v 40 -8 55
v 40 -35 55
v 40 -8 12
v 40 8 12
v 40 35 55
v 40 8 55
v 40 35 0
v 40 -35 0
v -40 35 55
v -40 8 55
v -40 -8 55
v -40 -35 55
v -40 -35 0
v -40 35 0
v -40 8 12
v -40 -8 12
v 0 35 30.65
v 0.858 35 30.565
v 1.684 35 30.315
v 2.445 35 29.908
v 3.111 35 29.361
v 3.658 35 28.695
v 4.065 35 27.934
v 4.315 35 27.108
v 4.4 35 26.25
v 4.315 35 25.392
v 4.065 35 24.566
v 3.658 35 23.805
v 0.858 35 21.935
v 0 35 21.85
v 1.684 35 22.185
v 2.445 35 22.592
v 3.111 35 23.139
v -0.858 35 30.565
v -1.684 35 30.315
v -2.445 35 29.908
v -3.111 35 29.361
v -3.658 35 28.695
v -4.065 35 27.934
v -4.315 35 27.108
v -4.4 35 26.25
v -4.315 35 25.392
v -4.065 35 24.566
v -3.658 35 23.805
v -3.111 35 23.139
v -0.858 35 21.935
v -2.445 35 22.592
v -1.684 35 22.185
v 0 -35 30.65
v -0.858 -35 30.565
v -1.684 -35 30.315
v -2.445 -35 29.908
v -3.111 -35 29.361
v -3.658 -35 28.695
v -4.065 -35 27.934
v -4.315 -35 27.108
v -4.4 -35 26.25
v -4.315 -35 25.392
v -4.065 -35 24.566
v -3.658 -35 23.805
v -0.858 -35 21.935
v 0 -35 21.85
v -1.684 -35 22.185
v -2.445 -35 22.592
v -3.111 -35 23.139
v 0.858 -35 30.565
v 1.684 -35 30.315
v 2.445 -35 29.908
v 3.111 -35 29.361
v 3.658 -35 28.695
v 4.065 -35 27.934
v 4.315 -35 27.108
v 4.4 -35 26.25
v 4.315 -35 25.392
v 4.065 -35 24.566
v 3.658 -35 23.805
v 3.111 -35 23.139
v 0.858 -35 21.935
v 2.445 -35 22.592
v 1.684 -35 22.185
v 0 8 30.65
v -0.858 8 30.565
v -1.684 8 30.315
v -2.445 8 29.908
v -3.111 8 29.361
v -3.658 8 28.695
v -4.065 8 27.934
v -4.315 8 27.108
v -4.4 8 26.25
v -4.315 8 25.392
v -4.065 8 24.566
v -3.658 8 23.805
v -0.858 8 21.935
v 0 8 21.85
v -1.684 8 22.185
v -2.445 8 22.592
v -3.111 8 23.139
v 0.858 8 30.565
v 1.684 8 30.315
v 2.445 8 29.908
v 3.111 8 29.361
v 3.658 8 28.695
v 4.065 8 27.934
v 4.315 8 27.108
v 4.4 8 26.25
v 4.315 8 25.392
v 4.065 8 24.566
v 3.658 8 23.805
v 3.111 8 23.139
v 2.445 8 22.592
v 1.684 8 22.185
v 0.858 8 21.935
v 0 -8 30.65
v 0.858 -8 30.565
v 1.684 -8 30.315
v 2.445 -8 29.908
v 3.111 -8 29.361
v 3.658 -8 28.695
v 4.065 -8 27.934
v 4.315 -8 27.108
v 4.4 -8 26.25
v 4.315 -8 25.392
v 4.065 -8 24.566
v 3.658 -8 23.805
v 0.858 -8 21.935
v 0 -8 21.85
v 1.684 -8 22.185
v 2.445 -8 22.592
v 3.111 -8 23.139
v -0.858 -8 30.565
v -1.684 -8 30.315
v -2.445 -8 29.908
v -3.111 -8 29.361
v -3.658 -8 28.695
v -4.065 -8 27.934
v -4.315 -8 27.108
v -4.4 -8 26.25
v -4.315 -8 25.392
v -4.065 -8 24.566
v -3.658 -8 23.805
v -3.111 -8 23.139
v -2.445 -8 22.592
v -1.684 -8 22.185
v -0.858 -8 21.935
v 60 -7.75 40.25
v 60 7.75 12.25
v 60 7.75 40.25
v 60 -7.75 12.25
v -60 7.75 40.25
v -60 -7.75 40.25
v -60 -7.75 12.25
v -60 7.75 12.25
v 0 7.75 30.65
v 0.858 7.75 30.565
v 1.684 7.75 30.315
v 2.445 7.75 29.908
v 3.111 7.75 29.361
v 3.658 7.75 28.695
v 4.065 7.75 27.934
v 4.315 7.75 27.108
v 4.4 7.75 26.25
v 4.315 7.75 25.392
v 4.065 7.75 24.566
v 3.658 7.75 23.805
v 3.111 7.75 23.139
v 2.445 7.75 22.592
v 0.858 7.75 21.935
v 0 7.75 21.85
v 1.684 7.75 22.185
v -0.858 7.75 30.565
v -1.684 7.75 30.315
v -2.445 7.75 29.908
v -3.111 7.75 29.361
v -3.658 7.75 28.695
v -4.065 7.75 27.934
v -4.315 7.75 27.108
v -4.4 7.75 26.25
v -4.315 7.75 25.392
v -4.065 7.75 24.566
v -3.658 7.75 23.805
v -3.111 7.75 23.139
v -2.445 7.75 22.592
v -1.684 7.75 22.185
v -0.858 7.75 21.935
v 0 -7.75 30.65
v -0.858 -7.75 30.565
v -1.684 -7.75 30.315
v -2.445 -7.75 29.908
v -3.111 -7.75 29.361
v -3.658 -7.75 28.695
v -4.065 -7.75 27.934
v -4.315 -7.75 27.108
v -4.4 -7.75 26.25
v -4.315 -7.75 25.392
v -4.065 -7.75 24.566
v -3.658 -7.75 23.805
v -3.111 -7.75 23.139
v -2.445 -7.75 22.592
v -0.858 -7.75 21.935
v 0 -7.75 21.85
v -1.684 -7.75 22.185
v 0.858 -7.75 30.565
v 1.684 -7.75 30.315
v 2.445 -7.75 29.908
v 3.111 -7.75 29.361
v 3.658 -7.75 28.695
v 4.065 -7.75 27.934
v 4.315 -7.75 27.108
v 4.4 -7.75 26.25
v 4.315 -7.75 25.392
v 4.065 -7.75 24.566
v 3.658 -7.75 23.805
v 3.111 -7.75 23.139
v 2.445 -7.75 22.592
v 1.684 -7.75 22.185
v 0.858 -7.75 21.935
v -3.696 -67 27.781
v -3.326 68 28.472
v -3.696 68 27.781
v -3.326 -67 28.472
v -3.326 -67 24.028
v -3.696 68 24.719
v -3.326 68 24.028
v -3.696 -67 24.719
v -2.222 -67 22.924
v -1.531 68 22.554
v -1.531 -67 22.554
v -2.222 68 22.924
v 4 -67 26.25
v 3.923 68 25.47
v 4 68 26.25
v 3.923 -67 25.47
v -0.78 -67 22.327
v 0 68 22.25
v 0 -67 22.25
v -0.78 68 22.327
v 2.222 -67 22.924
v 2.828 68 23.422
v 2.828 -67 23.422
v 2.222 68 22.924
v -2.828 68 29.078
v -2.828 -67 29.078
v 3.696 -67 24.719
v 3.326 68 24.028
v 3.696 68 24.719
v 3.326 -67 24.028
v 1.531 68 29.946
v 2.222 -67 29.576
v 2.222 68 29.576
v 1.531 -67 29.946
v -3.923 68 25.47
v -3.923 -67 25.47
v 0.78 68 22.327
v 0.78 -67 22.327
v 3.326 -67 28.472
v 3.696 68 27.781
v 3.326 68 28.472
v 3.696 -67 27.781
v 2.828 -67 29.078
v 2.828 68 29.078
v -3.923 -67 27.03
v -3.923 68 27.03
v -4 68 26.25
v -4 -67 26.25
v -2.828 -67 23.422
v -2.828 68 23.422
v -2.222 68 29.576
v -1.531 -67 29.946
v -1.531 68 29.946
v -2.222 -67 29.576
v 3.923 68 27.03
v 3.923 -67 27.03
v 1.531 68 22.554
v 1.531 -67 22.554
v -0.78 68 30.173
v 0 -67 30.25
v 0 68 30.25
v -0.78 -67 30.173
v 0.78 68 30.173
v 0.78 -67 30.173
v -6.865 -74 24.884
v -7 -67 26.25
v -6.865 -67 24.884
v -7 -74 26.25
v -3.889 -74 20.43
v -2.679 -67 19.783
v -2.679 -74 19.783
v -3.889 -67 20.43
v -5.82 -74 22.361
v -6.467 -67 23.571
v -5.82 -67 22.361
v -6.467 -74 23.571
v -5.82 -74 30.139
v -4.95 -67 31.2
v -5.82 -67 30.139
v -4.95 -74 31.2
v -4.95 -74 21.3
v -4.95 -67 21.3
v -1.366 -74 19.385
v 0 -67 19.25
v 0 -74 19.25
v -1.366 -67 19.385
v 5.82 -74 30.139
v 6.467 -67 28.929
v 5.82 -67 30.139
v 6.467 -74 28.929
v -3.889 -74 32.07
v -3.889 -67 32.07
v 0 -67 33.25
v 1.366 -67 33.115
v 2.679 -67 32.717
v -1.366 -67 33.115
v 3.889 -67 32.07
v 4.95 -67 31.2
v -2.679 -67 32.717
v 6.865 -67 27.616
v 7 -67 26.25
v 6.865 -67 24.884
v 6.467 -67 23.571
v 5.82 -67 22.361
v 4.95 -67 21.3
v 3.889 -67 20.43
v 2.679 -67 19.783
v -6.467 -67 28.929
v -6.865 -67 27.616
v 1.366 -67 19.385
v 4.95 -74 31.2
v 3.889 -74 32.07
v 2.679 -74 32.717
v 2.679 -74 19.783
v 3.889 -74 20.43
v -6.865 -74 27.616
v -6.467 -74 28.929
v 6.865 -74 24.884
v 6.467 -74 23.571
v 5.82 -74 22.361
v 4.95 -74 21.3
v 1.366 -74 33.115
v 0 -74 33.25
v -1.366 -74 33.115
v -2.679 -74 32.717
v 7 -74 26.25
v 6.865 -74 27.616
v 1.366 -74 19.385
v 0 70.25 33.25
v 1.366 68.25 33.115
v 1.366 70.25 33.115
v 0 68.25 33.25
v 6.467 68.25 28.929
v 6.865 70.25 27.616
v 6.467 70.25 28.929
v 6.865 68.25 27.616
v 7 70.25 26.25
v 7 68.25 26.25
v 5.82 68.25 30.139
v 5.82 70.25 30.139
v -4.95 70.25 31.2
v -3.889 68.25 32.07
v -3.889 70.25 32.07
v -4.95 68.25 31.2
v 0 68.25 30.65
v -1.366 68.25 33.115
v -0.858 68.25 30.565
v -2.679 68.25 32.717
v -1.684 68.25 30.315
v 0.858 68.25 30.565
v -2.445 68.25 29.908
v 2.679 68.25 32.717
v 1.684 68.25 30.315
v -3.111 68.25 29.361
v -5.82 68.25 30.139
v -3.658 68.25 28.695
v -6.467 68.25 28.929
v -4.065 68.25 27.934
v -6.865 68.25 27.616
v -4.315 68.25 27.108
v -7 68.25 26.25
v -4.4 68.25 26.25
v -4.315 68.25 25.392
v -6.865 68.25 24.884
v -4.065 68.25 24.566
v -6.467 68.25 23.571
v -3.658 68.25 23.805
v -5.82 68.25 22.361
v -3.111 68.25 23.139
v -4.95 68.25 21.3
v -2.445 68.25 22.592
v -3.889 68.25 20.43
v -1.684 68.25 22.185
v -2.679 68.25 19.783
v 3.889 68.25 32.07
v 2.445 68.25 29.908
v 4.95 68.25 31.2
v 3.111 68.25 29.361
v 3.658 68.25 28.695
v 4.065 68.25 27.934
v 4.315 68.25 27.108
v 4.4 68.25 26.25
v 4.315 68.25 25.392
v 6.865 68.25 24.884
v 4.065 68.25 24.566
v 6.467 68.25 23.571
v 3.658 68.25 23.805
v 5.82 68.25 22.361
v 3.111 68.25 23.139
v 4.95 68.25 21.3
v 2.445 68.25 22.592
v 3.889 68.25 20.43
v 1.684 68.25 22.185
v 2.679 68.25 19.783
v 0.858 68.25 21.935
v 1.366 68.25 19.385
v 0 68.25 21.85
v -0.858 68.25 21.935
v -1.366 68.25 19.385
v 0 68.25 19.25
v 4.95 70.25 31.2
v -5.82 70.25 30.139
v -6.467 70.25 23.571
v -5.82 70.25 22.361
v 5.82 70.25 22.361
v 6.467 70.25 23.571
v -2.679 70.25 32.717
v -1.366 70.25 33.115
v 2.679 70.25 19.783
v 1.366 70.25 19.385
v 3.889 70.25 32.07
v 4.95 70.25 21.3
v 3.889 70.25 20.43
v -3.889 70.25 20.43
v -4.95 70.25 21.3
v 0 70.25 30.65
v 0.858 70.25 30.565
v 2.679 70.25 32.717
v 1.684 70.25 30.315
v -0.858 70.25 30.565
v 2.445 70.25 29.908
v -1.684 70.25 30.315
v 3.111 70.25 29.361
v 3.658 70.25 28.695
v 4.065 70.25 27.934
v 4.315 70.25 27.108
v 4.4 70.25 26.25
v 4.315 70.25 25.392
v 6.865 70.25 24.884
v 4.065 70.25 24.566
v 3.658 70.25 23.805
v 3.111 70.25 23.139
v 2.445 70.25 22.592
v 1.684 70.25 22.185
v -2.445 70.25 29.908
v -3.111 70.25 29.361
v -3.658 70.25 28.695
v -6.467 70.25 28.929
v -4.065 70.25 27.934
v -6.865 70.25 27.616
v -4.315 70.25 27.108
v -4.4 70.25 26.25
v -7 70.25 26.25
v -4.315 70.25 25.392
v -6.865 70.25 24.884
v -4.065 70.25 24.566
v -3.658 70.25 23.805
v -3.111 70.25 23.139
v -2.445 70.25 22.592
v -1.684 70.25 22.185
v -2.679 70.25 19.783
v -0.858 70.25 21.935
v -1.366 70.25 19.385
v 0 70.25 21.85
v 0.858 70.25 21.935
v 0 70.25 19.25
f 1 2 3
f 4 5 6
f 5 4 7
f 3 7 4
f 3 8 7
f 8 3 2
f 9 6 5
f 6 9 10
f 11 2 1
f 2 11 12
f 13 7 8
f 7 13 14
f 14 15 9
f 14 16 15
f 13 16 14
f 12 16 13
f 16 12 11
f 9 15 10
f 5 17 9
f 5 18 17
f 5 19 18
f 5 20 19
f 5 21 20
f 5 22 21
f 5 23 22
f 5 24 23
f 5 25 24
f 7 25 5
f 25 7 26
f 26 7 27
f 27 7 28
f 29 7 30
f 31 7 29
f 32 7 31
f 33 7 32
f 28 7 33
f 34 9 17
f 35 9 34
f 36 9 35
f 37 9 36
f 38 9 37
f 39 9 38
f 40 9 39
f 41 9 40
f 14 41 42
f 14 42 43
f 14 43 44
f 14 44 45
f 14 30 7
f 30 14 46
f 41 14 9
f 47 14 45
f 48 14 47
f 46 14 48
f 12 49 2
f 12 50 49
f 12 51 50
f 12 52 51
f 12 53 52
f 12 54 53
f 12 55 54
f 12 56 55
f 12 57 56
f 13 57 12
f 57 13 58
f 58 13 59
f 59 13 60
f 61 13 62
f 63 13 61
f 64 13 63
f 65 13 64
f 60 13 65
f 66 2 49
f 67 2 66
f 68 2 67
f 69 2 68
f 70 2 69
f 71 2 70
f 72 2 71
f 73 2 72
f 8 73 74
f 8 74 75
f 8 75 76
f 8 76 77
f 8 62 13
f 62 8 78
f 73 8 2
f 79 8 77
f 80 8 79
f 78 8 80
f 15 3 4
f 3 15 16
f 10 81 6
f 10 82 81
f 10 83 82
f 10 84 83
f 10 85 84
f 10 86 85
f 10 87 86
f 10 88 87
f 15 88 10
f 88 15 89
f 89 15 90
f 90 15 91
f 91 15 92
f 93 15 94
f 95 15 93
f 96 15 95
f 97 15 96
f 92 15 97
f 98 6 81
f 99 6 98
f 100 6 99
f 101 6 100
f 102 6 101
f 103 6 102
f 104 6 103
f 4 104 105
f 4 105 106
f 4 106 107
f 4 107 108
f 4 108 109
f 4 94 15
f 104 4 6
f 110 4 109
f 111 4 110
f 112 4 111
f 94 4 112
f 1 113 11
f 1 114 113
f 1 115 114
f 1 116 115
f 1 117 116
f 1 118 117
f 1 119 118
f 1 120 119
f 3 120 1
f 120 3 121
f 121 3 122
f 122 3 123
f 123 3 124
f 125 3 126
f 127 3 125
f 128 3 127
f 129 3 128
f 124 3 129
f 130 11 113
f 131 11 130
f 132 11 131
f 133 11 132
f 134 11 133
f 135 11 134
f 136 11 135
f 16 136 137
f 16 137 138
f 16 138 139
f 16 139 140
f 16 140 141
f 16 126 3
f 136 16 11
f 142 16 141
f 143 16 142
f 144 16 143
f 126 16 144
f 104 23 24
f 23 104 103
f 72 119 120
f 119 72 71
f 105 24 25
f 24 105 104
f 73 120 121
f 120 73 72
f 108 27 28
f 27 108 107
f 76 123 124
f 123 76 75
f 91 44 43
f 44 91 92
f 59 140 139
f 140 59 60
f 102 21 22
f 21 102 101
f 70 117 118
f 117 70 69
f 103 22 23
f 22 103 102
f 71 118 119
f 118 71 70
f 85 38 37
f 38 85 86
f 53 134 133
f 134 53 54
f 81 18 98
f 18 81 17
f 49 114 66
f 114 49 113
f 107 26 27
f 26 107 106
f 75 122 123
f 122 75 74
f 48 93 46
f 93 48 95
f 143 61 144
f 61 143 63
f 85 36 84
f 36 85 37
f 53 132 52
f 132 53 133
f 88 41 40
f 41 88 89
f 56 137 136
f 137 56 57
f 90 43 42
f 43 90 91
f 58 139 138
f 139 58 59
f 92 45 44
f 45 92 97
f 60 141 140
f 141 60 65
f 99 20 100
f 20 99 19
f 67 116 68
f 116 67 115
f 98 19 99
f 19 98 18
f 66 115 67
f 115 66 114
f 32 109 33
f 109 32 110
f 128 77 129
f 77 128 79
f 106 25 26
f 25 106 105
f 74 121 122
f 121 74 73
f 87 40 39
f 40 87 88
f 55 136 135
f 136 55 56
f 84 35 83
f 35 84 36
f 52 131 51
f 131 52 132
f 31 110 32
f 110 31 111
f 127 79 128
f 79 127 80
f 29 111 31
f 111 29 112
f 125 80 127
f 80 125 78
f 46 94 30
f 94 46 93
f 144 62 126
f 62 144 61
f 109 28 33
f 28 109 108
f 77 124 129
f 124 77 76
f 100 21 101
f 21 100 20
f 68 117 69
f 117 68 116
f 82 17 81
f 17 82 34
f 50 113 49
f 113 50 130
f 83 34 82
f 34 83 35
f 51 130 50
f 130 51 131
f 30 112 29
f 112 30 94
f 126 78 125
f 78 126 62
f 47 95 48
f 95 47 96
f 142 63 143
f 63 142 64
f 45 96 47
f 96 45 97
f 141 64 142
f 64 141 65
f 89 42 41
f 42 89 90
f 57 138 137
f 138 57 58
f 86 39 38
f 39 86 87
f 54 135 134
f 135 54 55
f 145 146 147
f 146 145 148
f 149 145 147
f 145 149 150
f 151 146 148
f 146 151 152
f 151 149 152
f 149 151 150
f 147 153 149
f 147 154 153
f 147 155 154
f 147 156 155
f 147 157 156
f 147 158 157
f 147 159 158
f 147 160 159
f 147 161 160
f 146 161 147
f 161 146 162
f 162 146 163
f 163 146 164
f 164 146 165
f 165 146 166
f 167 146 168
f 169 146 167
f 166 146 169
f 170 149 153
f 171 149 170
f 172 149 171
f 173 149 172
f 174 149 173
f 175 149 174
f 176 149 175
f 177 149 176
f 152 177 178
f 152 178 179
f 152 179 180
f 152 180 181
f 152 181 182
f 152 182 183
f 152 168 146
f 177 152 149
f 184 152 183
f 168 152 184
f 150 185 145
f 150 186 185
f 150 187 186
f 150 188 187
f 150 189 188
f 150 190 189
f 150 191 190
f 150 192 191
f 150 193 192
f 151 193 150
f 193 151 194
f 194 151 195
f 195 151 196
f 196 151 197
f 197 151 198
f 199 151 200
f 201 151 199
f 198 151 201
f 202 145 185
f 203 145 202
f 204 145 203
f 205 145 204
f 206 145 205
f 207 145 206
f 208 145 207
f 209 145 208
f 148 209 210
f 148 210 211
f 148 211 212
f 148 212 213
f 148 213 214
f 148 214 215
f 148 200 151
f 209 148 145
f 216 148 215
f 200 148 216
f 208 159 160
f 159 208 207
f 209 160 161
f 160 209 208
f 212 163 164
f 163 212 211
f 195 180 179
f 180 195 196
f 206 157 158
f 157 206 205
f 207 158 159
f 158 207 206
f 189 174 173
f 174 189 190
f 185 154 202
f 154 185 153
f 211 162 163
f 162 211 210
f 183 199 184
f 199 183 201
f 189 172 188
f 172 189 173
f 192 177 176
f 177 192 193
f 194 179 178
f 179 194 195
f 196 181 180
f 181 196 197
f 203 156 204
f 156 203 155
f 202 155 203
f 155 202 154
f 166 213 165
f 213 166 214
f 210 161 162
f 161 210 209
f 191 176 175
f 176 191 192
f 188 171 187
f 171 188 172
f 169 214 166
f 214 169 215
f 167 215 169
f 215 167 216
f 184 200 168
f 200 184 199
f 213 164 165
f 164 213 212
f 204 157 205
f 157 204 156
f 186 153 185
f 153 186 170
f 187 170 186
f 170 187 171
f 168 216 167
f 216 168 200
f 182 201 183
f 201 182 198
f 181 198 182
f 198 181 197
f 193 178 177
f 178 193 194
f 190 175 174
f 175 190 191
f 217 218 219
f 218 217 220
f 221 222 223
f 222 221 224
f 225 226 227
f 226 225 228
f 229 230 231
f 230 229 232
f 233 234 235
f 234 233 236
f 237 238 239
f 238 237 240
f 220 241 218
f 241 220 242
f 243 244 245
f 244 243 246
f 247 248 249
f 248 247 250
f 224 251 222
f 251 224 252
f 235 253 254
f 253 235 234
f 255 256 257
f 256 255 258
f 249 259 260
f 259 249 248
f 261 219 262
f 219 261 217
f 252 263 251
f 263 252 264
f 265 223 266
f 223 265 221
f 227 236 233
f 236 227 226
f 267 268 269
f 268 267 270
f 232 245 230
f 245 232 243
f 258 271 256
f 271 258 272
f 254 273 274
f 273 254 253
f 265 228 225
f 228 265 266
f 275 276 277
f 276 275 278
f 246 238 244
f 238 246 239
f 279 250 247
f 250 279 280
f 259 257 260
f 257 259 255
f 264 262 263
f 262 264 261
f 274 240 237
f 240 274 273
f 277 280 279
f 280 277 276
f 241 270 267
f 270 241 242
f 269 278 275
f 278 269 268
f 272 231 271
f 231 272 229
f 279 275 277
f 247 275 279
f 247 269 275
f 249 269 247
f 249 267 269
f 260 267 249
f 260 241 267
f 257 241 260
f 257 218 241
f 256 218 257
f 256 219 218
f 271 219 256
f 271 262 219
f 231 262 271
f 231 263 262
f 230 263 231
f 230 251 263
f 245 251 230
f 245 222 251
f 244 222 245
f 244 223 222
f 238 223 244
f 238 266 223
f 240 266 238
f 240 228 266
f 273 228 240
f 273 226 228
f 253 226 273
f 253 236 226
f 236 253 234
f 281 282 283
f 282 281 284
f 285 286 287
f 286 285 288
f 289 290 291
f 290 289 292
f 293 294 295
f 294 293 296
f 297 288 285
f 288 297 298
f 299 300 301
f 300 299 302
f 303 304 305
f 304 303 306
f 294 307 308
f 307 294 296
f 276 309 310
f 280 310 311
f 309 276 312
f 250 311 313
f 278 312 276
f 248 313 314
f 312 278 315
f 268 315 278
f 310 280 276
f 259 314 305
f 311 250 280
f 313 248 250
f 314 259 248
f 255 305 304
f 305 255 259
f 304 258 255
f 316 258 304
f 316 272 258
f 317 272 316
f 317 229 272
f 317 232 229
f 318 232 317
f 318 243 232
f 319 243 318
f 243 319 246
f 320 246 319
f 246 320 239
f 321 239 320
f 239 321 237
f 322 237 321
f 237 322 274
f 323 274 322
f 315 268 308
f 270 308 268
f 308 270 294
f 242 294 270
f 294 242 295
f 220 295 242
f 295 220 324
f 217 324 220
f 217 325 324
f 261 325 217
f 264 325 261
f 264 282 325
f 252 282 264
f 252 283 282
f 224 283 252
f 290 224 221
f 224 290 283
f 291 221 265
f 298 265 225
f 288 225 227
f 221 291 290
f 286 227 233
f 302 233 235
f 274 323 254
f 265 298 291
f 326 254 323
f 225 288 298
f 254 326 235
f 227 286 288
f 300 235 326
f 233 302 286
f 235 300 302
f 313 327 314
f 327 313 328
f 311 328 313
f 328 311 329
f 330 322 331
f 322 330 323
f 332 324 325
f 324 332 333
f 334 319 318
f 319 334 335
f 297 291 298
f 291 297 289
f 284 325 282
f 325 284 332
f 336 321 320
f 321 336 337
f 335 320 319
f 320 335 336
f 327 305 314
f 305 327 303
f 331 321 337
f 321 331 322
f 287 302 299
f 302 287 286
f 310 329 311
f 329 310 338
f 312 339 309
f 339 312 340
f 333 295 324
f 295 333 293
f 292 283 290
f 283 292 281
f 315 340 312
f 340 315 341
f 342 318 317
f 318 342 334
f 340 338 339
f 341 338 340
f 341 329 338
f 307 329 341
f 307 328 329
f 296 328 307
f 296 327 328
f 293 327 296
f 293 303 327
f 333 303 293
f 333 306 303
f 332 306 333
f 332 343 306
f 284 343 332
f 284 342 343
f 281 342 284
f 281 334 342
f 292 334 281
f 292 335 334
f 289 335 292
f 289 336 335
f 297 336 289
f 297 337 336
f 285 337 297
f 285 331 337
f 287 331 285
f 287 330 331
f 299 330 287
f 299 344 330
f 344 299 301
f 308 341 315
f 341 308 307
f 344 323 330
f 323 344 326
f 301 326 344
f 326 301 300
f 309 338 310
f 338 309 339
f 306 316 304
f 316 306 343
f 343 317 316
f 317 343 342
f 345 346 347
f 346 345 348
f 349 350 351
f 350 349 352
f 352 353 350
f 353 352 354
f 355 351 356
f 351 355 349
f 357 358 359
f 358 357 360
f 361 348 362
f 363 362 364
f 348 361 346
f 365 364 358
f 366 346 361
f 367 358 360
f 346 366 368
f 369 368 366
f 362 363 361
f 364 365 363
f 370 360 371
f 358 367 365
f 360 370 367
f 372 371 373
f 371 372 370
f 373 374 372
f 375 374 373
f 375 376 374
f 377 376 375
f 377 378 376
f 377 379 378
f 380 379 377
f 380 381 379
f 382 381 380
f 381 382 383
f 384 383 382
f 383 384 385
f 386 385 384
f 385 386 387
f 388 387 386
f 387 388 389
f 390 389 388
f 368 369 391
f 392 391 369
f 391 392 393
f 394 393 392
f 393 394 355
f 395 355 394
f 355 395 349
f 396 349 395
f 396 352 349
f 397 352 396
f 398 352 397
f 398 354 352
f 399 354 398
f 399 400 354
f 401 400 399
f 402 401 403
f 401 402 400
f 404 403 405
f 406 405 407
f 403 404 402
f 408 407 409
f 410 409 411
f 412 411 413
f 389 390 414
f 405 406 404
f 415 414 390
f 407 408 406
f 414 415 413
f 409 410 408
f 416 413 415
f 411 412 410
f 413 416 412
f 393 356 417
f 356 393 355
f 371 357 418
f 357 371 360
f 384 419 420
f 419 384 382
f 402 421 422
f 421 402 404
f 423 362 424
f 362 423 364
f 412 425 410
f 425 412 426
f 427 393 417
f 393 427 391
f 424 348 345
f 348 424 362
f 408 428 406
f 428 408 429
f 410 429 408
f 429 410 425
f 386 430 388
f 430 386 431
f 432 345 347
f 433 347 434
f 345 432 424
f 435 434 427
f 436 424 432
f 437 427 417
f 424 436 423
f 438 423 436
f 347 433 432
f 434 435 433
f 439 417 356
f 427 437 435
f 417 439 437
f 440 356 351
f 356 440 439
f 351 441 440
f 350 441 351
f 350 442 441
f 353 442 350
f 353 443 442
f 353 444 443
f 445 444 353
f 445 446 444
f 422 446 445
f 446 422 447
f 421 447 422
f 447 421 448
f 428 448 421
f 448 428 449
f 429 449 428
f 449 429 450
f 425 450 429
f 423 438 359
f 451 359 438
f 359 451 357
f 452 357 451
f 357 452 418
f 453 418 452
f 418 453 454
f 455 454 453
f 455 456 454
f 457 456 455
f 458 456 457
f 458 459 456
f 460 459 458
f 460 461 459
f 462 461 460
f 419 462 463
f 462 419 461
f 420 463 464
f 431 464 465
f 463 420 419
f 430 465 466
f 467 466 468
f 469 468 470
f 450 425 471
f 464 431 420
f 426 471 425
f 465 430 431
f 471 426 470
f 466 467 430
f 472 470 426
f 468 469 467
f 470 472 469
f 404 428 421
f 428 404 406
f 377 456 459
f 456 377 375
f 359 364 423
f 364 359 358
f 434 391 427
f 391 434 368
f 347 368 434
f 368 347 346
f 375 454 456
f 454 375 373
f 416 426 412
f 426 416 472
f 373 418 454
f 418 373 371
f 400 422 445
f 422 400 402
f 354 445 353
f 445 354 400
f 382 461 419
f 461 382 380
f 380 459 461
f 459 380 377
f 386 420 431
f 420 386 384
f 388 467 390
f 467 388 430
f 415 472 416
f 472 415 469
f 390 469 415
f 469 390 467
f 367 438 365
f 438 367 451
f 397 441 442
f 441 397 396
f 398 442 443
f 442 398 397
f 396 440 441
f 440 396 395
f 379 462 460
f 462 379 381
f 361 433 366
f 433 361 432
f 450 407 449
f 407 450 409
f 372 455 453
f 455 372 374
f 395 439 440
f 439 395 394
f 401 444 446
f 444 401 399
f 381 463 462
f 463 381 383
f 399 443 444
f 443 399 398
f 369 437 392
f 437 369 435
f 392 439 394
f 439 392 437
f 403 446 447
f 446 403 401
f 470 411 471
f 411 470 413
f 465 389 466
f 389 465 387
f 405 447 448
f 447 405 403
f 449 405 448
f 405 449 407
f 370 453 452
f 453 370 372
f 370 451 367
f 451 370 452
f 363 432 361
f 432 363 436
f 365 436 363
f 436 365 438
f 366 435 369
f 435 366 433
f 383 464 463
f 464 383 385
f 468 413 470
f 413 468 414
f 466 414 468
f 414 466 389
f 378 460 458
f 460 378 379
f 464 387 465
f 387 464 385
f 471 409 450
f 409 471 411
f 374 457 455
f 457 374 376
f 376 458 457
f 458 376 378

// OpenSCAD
$fn = 32;

// ------------------------------------------------------------------------
// Clevis joint: 80 mm clevis, pin d8
// Every part is its own module, assembly() places them once.
// ------------------------------------------------------------------------

// --- part 1 ---
module clevis() {
  difference() {
    translate([-40, -35, 0]) cube([80, 70, 55]);
    translate([-41, -8, 12]) cube([82, 16, 44]);
    translate([0, 0, 26.25]) rotate([90, 0, 0]) cylinder(h = 72, d = 8.8, center = true);
  }
}

// --- part 2 ---
module eye() {
  difference() {
    translate([-60, -7.75, 0]) cube([120, 15.5, 28]);
    translate([0, 0, 14]) rotate([90, 0, 0]) cylinder(h = 17.5, d = 8.8, center = true);
  }
}

// --- part 3 ---
module pin() {
  rotate([0, 90, 0]) cylinder(h = 136, d = 8, center = true);
  translate([-74, 0, 0]) rotate([0, 90, 0]) cylinder(h = 7, d = 14);
}

// --- part 4 ---
module retainer() {
  difference() {
      translate([0, 0, 0]) cylinder(h = 2, d = 14);
      translate([0, 0, -1]) cylinder(h = 4, d = 8.8);
    }
}

// --- assembly ---
module assembly() {
  translate([0, 0, 0]) rotate([0, 0, 0]) clevis();
  translate([0, 0, 12.25]) rotate([0, 0, 0]) eye();
  translate([0, 0, 26.25]) rotate([0, 0, 90]) pin();
  translate([0, 70.25, 26.25]) rotate([90, 0, 0]) retainer();
}

assembly();
